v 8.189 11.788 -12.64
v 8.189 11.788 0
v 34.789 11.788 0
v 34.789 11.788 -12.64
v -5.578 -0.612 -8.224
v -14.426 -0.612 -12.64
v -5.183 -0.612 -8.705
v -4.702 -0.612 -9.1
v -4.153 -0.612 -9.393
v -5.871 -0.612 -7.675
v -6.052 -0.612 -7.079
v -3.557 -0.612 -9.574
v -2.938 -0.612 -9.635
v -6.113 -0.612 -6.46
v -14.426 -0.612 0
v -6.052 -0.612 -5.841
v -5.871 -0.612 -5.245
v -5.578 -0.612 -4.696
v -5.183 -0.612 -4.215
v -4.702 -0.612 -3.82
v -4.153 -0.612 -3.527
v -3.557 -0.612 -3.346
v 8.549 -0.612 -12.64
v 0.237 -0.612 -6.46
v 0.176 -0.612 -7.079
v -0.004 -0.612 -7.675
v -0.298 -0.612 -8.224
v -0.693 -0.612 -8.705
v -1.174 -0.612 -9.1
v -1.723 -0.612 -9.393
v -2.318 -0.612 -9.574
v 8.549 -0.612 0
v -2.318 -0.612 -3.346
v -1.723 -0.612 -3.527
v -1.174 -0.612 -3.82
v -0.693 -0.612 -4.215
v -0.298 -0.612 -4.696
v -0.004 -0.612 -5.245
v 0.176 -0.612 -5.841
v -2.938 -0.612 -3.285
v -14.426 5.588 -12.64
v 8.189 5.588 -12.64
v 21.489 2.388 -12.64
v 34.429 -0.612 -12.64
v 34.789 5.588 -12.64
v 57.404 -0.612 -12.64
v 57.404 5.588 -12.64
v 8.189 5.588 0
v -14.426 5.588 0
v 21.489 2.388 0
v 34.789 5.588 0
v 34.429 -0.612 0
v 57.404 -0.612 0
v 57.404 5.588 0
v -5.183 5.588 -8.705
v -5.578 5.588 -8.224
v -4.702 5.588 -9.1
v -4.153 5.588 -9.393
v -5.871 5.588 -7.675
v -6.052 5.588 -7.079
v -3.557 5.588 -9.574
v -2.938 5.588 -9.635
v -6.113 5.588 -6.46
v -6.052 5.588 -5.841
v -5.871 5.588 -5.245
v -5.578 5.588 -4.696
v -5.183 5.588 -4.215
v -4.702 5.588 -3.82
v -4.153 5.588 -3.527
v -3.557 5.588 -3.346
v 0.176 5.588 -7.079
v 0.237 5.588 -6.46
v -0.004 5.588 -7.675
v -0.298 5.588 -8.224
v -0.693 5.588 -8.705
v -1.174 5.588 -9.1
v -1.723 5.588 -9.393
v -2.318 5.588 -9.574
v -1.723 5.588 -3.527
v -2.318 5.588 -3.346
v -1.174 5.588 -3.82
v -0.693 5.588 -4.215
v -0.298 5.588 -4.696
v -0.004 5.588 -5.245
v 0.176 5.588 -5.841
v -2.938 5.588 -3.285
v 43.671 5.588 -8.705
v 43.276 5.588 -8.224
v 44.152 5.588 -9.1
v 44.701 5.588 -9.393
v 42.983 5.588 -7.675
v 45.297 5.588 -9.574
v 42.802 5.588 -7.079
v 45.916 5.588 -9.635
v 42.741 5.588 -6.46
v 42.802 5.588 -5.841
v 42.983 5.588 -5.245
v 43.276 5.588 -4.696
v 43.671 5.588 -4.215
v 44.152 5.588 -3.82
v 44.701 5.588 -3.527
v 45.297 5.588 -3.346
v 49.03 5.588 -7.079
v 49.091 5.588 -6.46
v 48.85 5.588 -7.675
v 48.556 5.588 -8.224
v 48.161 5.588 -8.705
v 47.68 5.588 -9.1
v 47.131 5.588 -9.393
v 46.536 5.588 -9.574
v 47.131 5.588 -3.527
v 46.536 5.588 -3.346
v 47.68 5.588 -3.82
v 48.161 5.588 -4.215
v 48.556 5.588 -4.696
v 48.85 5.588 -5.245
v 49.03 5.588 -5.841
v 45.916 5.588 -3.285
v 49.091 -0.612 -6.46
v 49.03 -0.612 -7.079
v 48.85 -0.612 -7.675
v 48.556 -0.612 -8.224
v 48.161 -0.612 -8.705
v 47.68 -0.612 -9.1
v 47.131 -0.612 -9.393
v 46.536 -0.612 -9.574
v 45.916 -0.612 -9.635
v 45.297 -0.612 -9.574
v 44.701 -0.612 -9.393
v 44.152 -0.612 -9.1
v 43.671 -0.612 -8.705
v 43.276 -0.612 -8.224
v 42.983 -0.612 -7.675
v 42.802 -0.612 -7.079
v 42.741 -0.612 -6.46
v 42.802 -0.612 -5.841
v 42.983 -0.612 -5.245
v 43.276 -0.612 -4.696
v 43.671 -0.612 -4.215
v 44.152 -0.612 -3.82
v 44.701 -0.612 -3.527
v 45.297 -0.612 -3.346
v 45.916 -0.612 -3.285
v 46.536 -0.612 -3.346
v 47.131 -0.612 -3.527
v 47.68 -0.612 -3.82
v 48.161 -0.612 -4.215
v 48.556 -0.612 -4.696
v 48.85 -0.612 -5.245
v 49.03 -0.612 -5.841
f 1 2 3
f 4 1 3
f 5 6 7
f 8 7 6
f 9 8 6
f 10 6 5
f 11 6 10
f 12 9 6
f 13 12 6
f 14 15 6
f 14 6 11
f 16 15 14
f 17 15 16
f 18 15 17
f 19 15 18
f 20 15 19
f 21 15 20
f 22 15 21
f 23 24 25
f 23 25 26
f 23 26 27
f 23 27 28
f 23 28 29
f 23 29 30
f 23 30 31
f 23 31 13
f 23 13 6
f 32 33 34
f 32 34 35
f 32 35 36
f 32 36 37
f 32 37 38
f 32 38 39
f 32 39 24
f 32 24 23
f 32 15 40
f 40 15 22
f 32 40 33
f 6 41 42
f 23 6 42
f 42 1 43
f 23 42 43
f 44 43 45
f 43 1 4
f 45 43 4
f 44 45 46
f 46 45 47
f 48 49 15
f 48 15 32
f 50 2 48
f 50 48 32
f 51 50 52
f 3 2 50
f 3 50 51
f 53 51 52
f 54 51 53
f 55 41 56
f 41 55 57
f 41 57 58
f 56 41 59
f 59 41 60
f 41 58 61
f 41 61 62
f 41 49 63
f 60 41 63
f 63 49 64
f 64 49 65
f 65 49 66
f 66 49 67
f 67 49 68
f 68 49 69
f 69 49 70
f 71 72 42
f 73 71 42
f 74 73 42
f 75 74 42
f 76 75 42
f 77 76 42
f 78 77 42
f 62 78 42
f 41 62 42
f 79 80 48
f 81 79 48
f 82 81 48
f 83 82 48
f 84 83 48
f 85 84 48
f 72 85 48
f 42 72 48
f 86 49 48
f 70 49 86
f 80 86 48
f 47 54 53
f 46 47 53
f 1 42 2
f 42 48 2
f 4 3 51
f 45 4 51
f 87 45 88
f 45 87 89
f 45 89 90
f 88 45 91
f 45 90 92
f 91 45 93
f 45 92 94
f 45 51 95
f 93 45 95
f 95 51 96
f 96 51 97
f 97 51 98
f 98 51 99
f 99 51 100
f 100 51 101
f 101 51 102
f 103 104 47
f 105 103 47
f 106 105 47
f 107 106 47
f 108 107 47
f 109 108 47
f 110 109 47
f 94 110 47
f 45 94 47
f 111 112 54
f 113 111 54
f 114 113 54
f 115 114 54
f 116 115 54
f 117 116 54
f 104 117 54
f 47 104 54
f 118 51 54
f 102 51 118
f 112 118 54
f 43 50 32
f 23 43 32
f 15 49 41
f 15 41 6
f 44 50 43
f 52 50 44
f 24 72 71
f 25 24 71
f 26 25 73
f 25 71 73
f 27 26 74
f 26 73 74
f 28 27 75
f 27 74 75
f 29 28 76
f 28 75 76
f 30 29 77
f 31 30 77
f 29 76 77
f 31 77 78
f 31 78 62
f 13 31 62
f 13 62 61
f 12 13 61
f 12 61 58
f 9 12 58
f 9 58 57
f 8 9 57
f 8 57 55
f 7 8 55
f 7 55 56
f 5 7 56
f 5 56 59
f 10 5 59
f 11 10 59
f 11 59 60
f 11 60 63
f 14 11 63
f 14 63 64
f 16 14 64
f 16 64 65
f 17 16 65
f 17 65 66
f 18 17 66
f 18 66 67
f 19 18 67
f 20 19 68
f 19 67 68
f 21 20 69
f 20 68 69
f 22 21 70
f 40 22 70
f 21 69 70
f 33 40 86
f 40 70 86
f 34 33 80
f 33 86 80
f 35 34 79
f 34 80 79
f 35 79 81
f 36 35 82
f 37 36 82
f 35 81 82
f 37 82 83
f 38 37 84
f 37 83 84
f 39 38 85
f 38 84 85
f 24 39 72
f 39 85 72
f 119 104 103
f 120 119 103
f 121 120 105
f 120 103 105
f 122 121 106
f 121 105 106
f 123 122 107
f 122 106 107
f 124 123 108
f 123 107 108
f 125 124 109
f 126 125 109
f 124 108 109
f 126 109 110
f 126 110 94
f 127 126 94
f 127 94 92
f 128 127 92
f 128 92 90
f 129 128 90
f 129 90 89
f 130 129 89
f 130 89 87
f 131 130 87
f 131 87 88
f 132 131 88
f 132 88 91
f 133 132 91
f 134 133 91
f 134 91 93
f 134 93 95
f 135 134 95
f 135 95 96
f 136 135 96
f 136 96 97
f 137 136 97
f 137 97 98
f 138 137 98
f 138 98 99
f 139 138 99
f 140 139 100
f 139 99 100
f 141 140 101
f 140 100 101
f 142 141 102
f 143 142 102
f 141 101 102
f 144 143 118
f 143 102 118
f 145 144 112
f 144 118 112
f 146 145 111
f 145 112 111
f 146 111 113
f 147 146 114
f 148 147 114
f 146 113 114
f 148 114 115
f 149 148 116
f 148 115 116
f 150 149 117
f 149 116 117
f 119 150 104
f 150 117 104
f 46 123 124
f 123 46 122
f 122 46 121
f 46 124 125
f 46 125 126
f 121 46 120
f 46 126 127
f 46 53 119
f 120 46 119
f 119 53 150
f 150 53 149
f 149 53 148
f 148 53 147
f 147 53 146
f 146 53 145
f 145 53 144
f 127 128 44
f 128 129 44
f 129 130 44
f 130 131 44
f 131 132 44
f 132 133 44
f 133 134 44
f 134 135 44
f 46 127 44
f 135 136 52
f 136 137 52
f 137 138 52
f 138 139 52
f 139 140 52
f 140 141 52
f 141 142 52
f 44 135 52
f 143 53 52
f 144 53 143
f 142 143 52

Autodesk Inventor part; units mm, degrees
ref_plane "YZ Plane" through (0, 0, 0) normal (1, 0, 0) x (0, 1, 0)
ref_plane "XZ Plane" through (0, 0, 0) normal (0, 1, 0) x (-1, 0, 0)
ref_plane "XY Plane" through (0, 0, 0) normal (0, 0, 1) x (1, 0, 0)
sketch "Sketch1" plane through (0, 0, 0) normal (0, 0, 1) x (1, 0, 0)
  line L0 (-14.4256, 5.5876) -> (8.1894, 5.5876)
  line L1 (8.1894, 5.5876) -> (8.1894, 11.7876)
  line L2 (8.1894, 11.7876) -> (34.7894, 11.7876)
  line L3 (34.7894, 11.7876) -> (34.7894, 5.5876)
  line L4 (34.7894, 5.5876) -> (57.4044, 5.5876)
  line L5 (57.4044, 5.5876) -> (57.4044, -0.6124)
  line L6 (57.4044, -0.6124) -> (34.4294, -0.6124)
  line L7 (-14.4256, 5.5876) -> (-14.4256, -0.6124)
  line L8 (-14.4256, -0.6124) -> (8.5494, -0.6124)
  line L9 (21.4894, 2.3876) -> (8.5494, -0.6124)
  line L10 (21.4894, 2.3876) -> (34.4294, -0.6124)
  point P0 (0, 0)
  dimension "d0" = 22.615
  dimension "d1" = 6.2
  dimension "d2" = 26.6
  dimension "d3" = 22.615
  dimension "d4" = 6.2
  dimension "d5" = 22.975
  dimension "d9" = 22.975
extrude "Extrusion1" add sketch "Sketch1" against normal blind 12.64
sketch "Sketch2" plane through (-14.4256, 5.5876, 0) normal (0, 1, 0) x (1, 0, 0)
  circle A0 centre (11.488, 6.46) radius 3.175
  circle A1 centre (60.342, 6.46) radius 3.175
  line L0 (0, 0) -> (0, 12.64) projected
  line L1 (0, 12.64) -> (22.615, 12.64) projected
  line L2 (49.215, 12.64) -> (71.83, 12.64) projected
  line L3 (71.83, 0) -> (71.83, 12.64) projected
  point P0 (14.4256, 0)
  dimension "d14" = 11.488
  dimension "d15" = 6.18
  dimension "d16" = 6.35
  dimension "d17" = 6.18
  dimension "d18" = 11.488
  dimension "d19" = 6.35
extrude "Extrusion2" cut sketch "Sketch2" against normal blind 12.64
thread "Thread1" size "1/4-20 UNC" class "2B" standard "ANSI Unified Screw Threads" full length
thread "Thread2" size "1/4-20 UNC" class "2B" standard "ANSI Unified Screw Threads" full length
properties part number "syringe holder"
